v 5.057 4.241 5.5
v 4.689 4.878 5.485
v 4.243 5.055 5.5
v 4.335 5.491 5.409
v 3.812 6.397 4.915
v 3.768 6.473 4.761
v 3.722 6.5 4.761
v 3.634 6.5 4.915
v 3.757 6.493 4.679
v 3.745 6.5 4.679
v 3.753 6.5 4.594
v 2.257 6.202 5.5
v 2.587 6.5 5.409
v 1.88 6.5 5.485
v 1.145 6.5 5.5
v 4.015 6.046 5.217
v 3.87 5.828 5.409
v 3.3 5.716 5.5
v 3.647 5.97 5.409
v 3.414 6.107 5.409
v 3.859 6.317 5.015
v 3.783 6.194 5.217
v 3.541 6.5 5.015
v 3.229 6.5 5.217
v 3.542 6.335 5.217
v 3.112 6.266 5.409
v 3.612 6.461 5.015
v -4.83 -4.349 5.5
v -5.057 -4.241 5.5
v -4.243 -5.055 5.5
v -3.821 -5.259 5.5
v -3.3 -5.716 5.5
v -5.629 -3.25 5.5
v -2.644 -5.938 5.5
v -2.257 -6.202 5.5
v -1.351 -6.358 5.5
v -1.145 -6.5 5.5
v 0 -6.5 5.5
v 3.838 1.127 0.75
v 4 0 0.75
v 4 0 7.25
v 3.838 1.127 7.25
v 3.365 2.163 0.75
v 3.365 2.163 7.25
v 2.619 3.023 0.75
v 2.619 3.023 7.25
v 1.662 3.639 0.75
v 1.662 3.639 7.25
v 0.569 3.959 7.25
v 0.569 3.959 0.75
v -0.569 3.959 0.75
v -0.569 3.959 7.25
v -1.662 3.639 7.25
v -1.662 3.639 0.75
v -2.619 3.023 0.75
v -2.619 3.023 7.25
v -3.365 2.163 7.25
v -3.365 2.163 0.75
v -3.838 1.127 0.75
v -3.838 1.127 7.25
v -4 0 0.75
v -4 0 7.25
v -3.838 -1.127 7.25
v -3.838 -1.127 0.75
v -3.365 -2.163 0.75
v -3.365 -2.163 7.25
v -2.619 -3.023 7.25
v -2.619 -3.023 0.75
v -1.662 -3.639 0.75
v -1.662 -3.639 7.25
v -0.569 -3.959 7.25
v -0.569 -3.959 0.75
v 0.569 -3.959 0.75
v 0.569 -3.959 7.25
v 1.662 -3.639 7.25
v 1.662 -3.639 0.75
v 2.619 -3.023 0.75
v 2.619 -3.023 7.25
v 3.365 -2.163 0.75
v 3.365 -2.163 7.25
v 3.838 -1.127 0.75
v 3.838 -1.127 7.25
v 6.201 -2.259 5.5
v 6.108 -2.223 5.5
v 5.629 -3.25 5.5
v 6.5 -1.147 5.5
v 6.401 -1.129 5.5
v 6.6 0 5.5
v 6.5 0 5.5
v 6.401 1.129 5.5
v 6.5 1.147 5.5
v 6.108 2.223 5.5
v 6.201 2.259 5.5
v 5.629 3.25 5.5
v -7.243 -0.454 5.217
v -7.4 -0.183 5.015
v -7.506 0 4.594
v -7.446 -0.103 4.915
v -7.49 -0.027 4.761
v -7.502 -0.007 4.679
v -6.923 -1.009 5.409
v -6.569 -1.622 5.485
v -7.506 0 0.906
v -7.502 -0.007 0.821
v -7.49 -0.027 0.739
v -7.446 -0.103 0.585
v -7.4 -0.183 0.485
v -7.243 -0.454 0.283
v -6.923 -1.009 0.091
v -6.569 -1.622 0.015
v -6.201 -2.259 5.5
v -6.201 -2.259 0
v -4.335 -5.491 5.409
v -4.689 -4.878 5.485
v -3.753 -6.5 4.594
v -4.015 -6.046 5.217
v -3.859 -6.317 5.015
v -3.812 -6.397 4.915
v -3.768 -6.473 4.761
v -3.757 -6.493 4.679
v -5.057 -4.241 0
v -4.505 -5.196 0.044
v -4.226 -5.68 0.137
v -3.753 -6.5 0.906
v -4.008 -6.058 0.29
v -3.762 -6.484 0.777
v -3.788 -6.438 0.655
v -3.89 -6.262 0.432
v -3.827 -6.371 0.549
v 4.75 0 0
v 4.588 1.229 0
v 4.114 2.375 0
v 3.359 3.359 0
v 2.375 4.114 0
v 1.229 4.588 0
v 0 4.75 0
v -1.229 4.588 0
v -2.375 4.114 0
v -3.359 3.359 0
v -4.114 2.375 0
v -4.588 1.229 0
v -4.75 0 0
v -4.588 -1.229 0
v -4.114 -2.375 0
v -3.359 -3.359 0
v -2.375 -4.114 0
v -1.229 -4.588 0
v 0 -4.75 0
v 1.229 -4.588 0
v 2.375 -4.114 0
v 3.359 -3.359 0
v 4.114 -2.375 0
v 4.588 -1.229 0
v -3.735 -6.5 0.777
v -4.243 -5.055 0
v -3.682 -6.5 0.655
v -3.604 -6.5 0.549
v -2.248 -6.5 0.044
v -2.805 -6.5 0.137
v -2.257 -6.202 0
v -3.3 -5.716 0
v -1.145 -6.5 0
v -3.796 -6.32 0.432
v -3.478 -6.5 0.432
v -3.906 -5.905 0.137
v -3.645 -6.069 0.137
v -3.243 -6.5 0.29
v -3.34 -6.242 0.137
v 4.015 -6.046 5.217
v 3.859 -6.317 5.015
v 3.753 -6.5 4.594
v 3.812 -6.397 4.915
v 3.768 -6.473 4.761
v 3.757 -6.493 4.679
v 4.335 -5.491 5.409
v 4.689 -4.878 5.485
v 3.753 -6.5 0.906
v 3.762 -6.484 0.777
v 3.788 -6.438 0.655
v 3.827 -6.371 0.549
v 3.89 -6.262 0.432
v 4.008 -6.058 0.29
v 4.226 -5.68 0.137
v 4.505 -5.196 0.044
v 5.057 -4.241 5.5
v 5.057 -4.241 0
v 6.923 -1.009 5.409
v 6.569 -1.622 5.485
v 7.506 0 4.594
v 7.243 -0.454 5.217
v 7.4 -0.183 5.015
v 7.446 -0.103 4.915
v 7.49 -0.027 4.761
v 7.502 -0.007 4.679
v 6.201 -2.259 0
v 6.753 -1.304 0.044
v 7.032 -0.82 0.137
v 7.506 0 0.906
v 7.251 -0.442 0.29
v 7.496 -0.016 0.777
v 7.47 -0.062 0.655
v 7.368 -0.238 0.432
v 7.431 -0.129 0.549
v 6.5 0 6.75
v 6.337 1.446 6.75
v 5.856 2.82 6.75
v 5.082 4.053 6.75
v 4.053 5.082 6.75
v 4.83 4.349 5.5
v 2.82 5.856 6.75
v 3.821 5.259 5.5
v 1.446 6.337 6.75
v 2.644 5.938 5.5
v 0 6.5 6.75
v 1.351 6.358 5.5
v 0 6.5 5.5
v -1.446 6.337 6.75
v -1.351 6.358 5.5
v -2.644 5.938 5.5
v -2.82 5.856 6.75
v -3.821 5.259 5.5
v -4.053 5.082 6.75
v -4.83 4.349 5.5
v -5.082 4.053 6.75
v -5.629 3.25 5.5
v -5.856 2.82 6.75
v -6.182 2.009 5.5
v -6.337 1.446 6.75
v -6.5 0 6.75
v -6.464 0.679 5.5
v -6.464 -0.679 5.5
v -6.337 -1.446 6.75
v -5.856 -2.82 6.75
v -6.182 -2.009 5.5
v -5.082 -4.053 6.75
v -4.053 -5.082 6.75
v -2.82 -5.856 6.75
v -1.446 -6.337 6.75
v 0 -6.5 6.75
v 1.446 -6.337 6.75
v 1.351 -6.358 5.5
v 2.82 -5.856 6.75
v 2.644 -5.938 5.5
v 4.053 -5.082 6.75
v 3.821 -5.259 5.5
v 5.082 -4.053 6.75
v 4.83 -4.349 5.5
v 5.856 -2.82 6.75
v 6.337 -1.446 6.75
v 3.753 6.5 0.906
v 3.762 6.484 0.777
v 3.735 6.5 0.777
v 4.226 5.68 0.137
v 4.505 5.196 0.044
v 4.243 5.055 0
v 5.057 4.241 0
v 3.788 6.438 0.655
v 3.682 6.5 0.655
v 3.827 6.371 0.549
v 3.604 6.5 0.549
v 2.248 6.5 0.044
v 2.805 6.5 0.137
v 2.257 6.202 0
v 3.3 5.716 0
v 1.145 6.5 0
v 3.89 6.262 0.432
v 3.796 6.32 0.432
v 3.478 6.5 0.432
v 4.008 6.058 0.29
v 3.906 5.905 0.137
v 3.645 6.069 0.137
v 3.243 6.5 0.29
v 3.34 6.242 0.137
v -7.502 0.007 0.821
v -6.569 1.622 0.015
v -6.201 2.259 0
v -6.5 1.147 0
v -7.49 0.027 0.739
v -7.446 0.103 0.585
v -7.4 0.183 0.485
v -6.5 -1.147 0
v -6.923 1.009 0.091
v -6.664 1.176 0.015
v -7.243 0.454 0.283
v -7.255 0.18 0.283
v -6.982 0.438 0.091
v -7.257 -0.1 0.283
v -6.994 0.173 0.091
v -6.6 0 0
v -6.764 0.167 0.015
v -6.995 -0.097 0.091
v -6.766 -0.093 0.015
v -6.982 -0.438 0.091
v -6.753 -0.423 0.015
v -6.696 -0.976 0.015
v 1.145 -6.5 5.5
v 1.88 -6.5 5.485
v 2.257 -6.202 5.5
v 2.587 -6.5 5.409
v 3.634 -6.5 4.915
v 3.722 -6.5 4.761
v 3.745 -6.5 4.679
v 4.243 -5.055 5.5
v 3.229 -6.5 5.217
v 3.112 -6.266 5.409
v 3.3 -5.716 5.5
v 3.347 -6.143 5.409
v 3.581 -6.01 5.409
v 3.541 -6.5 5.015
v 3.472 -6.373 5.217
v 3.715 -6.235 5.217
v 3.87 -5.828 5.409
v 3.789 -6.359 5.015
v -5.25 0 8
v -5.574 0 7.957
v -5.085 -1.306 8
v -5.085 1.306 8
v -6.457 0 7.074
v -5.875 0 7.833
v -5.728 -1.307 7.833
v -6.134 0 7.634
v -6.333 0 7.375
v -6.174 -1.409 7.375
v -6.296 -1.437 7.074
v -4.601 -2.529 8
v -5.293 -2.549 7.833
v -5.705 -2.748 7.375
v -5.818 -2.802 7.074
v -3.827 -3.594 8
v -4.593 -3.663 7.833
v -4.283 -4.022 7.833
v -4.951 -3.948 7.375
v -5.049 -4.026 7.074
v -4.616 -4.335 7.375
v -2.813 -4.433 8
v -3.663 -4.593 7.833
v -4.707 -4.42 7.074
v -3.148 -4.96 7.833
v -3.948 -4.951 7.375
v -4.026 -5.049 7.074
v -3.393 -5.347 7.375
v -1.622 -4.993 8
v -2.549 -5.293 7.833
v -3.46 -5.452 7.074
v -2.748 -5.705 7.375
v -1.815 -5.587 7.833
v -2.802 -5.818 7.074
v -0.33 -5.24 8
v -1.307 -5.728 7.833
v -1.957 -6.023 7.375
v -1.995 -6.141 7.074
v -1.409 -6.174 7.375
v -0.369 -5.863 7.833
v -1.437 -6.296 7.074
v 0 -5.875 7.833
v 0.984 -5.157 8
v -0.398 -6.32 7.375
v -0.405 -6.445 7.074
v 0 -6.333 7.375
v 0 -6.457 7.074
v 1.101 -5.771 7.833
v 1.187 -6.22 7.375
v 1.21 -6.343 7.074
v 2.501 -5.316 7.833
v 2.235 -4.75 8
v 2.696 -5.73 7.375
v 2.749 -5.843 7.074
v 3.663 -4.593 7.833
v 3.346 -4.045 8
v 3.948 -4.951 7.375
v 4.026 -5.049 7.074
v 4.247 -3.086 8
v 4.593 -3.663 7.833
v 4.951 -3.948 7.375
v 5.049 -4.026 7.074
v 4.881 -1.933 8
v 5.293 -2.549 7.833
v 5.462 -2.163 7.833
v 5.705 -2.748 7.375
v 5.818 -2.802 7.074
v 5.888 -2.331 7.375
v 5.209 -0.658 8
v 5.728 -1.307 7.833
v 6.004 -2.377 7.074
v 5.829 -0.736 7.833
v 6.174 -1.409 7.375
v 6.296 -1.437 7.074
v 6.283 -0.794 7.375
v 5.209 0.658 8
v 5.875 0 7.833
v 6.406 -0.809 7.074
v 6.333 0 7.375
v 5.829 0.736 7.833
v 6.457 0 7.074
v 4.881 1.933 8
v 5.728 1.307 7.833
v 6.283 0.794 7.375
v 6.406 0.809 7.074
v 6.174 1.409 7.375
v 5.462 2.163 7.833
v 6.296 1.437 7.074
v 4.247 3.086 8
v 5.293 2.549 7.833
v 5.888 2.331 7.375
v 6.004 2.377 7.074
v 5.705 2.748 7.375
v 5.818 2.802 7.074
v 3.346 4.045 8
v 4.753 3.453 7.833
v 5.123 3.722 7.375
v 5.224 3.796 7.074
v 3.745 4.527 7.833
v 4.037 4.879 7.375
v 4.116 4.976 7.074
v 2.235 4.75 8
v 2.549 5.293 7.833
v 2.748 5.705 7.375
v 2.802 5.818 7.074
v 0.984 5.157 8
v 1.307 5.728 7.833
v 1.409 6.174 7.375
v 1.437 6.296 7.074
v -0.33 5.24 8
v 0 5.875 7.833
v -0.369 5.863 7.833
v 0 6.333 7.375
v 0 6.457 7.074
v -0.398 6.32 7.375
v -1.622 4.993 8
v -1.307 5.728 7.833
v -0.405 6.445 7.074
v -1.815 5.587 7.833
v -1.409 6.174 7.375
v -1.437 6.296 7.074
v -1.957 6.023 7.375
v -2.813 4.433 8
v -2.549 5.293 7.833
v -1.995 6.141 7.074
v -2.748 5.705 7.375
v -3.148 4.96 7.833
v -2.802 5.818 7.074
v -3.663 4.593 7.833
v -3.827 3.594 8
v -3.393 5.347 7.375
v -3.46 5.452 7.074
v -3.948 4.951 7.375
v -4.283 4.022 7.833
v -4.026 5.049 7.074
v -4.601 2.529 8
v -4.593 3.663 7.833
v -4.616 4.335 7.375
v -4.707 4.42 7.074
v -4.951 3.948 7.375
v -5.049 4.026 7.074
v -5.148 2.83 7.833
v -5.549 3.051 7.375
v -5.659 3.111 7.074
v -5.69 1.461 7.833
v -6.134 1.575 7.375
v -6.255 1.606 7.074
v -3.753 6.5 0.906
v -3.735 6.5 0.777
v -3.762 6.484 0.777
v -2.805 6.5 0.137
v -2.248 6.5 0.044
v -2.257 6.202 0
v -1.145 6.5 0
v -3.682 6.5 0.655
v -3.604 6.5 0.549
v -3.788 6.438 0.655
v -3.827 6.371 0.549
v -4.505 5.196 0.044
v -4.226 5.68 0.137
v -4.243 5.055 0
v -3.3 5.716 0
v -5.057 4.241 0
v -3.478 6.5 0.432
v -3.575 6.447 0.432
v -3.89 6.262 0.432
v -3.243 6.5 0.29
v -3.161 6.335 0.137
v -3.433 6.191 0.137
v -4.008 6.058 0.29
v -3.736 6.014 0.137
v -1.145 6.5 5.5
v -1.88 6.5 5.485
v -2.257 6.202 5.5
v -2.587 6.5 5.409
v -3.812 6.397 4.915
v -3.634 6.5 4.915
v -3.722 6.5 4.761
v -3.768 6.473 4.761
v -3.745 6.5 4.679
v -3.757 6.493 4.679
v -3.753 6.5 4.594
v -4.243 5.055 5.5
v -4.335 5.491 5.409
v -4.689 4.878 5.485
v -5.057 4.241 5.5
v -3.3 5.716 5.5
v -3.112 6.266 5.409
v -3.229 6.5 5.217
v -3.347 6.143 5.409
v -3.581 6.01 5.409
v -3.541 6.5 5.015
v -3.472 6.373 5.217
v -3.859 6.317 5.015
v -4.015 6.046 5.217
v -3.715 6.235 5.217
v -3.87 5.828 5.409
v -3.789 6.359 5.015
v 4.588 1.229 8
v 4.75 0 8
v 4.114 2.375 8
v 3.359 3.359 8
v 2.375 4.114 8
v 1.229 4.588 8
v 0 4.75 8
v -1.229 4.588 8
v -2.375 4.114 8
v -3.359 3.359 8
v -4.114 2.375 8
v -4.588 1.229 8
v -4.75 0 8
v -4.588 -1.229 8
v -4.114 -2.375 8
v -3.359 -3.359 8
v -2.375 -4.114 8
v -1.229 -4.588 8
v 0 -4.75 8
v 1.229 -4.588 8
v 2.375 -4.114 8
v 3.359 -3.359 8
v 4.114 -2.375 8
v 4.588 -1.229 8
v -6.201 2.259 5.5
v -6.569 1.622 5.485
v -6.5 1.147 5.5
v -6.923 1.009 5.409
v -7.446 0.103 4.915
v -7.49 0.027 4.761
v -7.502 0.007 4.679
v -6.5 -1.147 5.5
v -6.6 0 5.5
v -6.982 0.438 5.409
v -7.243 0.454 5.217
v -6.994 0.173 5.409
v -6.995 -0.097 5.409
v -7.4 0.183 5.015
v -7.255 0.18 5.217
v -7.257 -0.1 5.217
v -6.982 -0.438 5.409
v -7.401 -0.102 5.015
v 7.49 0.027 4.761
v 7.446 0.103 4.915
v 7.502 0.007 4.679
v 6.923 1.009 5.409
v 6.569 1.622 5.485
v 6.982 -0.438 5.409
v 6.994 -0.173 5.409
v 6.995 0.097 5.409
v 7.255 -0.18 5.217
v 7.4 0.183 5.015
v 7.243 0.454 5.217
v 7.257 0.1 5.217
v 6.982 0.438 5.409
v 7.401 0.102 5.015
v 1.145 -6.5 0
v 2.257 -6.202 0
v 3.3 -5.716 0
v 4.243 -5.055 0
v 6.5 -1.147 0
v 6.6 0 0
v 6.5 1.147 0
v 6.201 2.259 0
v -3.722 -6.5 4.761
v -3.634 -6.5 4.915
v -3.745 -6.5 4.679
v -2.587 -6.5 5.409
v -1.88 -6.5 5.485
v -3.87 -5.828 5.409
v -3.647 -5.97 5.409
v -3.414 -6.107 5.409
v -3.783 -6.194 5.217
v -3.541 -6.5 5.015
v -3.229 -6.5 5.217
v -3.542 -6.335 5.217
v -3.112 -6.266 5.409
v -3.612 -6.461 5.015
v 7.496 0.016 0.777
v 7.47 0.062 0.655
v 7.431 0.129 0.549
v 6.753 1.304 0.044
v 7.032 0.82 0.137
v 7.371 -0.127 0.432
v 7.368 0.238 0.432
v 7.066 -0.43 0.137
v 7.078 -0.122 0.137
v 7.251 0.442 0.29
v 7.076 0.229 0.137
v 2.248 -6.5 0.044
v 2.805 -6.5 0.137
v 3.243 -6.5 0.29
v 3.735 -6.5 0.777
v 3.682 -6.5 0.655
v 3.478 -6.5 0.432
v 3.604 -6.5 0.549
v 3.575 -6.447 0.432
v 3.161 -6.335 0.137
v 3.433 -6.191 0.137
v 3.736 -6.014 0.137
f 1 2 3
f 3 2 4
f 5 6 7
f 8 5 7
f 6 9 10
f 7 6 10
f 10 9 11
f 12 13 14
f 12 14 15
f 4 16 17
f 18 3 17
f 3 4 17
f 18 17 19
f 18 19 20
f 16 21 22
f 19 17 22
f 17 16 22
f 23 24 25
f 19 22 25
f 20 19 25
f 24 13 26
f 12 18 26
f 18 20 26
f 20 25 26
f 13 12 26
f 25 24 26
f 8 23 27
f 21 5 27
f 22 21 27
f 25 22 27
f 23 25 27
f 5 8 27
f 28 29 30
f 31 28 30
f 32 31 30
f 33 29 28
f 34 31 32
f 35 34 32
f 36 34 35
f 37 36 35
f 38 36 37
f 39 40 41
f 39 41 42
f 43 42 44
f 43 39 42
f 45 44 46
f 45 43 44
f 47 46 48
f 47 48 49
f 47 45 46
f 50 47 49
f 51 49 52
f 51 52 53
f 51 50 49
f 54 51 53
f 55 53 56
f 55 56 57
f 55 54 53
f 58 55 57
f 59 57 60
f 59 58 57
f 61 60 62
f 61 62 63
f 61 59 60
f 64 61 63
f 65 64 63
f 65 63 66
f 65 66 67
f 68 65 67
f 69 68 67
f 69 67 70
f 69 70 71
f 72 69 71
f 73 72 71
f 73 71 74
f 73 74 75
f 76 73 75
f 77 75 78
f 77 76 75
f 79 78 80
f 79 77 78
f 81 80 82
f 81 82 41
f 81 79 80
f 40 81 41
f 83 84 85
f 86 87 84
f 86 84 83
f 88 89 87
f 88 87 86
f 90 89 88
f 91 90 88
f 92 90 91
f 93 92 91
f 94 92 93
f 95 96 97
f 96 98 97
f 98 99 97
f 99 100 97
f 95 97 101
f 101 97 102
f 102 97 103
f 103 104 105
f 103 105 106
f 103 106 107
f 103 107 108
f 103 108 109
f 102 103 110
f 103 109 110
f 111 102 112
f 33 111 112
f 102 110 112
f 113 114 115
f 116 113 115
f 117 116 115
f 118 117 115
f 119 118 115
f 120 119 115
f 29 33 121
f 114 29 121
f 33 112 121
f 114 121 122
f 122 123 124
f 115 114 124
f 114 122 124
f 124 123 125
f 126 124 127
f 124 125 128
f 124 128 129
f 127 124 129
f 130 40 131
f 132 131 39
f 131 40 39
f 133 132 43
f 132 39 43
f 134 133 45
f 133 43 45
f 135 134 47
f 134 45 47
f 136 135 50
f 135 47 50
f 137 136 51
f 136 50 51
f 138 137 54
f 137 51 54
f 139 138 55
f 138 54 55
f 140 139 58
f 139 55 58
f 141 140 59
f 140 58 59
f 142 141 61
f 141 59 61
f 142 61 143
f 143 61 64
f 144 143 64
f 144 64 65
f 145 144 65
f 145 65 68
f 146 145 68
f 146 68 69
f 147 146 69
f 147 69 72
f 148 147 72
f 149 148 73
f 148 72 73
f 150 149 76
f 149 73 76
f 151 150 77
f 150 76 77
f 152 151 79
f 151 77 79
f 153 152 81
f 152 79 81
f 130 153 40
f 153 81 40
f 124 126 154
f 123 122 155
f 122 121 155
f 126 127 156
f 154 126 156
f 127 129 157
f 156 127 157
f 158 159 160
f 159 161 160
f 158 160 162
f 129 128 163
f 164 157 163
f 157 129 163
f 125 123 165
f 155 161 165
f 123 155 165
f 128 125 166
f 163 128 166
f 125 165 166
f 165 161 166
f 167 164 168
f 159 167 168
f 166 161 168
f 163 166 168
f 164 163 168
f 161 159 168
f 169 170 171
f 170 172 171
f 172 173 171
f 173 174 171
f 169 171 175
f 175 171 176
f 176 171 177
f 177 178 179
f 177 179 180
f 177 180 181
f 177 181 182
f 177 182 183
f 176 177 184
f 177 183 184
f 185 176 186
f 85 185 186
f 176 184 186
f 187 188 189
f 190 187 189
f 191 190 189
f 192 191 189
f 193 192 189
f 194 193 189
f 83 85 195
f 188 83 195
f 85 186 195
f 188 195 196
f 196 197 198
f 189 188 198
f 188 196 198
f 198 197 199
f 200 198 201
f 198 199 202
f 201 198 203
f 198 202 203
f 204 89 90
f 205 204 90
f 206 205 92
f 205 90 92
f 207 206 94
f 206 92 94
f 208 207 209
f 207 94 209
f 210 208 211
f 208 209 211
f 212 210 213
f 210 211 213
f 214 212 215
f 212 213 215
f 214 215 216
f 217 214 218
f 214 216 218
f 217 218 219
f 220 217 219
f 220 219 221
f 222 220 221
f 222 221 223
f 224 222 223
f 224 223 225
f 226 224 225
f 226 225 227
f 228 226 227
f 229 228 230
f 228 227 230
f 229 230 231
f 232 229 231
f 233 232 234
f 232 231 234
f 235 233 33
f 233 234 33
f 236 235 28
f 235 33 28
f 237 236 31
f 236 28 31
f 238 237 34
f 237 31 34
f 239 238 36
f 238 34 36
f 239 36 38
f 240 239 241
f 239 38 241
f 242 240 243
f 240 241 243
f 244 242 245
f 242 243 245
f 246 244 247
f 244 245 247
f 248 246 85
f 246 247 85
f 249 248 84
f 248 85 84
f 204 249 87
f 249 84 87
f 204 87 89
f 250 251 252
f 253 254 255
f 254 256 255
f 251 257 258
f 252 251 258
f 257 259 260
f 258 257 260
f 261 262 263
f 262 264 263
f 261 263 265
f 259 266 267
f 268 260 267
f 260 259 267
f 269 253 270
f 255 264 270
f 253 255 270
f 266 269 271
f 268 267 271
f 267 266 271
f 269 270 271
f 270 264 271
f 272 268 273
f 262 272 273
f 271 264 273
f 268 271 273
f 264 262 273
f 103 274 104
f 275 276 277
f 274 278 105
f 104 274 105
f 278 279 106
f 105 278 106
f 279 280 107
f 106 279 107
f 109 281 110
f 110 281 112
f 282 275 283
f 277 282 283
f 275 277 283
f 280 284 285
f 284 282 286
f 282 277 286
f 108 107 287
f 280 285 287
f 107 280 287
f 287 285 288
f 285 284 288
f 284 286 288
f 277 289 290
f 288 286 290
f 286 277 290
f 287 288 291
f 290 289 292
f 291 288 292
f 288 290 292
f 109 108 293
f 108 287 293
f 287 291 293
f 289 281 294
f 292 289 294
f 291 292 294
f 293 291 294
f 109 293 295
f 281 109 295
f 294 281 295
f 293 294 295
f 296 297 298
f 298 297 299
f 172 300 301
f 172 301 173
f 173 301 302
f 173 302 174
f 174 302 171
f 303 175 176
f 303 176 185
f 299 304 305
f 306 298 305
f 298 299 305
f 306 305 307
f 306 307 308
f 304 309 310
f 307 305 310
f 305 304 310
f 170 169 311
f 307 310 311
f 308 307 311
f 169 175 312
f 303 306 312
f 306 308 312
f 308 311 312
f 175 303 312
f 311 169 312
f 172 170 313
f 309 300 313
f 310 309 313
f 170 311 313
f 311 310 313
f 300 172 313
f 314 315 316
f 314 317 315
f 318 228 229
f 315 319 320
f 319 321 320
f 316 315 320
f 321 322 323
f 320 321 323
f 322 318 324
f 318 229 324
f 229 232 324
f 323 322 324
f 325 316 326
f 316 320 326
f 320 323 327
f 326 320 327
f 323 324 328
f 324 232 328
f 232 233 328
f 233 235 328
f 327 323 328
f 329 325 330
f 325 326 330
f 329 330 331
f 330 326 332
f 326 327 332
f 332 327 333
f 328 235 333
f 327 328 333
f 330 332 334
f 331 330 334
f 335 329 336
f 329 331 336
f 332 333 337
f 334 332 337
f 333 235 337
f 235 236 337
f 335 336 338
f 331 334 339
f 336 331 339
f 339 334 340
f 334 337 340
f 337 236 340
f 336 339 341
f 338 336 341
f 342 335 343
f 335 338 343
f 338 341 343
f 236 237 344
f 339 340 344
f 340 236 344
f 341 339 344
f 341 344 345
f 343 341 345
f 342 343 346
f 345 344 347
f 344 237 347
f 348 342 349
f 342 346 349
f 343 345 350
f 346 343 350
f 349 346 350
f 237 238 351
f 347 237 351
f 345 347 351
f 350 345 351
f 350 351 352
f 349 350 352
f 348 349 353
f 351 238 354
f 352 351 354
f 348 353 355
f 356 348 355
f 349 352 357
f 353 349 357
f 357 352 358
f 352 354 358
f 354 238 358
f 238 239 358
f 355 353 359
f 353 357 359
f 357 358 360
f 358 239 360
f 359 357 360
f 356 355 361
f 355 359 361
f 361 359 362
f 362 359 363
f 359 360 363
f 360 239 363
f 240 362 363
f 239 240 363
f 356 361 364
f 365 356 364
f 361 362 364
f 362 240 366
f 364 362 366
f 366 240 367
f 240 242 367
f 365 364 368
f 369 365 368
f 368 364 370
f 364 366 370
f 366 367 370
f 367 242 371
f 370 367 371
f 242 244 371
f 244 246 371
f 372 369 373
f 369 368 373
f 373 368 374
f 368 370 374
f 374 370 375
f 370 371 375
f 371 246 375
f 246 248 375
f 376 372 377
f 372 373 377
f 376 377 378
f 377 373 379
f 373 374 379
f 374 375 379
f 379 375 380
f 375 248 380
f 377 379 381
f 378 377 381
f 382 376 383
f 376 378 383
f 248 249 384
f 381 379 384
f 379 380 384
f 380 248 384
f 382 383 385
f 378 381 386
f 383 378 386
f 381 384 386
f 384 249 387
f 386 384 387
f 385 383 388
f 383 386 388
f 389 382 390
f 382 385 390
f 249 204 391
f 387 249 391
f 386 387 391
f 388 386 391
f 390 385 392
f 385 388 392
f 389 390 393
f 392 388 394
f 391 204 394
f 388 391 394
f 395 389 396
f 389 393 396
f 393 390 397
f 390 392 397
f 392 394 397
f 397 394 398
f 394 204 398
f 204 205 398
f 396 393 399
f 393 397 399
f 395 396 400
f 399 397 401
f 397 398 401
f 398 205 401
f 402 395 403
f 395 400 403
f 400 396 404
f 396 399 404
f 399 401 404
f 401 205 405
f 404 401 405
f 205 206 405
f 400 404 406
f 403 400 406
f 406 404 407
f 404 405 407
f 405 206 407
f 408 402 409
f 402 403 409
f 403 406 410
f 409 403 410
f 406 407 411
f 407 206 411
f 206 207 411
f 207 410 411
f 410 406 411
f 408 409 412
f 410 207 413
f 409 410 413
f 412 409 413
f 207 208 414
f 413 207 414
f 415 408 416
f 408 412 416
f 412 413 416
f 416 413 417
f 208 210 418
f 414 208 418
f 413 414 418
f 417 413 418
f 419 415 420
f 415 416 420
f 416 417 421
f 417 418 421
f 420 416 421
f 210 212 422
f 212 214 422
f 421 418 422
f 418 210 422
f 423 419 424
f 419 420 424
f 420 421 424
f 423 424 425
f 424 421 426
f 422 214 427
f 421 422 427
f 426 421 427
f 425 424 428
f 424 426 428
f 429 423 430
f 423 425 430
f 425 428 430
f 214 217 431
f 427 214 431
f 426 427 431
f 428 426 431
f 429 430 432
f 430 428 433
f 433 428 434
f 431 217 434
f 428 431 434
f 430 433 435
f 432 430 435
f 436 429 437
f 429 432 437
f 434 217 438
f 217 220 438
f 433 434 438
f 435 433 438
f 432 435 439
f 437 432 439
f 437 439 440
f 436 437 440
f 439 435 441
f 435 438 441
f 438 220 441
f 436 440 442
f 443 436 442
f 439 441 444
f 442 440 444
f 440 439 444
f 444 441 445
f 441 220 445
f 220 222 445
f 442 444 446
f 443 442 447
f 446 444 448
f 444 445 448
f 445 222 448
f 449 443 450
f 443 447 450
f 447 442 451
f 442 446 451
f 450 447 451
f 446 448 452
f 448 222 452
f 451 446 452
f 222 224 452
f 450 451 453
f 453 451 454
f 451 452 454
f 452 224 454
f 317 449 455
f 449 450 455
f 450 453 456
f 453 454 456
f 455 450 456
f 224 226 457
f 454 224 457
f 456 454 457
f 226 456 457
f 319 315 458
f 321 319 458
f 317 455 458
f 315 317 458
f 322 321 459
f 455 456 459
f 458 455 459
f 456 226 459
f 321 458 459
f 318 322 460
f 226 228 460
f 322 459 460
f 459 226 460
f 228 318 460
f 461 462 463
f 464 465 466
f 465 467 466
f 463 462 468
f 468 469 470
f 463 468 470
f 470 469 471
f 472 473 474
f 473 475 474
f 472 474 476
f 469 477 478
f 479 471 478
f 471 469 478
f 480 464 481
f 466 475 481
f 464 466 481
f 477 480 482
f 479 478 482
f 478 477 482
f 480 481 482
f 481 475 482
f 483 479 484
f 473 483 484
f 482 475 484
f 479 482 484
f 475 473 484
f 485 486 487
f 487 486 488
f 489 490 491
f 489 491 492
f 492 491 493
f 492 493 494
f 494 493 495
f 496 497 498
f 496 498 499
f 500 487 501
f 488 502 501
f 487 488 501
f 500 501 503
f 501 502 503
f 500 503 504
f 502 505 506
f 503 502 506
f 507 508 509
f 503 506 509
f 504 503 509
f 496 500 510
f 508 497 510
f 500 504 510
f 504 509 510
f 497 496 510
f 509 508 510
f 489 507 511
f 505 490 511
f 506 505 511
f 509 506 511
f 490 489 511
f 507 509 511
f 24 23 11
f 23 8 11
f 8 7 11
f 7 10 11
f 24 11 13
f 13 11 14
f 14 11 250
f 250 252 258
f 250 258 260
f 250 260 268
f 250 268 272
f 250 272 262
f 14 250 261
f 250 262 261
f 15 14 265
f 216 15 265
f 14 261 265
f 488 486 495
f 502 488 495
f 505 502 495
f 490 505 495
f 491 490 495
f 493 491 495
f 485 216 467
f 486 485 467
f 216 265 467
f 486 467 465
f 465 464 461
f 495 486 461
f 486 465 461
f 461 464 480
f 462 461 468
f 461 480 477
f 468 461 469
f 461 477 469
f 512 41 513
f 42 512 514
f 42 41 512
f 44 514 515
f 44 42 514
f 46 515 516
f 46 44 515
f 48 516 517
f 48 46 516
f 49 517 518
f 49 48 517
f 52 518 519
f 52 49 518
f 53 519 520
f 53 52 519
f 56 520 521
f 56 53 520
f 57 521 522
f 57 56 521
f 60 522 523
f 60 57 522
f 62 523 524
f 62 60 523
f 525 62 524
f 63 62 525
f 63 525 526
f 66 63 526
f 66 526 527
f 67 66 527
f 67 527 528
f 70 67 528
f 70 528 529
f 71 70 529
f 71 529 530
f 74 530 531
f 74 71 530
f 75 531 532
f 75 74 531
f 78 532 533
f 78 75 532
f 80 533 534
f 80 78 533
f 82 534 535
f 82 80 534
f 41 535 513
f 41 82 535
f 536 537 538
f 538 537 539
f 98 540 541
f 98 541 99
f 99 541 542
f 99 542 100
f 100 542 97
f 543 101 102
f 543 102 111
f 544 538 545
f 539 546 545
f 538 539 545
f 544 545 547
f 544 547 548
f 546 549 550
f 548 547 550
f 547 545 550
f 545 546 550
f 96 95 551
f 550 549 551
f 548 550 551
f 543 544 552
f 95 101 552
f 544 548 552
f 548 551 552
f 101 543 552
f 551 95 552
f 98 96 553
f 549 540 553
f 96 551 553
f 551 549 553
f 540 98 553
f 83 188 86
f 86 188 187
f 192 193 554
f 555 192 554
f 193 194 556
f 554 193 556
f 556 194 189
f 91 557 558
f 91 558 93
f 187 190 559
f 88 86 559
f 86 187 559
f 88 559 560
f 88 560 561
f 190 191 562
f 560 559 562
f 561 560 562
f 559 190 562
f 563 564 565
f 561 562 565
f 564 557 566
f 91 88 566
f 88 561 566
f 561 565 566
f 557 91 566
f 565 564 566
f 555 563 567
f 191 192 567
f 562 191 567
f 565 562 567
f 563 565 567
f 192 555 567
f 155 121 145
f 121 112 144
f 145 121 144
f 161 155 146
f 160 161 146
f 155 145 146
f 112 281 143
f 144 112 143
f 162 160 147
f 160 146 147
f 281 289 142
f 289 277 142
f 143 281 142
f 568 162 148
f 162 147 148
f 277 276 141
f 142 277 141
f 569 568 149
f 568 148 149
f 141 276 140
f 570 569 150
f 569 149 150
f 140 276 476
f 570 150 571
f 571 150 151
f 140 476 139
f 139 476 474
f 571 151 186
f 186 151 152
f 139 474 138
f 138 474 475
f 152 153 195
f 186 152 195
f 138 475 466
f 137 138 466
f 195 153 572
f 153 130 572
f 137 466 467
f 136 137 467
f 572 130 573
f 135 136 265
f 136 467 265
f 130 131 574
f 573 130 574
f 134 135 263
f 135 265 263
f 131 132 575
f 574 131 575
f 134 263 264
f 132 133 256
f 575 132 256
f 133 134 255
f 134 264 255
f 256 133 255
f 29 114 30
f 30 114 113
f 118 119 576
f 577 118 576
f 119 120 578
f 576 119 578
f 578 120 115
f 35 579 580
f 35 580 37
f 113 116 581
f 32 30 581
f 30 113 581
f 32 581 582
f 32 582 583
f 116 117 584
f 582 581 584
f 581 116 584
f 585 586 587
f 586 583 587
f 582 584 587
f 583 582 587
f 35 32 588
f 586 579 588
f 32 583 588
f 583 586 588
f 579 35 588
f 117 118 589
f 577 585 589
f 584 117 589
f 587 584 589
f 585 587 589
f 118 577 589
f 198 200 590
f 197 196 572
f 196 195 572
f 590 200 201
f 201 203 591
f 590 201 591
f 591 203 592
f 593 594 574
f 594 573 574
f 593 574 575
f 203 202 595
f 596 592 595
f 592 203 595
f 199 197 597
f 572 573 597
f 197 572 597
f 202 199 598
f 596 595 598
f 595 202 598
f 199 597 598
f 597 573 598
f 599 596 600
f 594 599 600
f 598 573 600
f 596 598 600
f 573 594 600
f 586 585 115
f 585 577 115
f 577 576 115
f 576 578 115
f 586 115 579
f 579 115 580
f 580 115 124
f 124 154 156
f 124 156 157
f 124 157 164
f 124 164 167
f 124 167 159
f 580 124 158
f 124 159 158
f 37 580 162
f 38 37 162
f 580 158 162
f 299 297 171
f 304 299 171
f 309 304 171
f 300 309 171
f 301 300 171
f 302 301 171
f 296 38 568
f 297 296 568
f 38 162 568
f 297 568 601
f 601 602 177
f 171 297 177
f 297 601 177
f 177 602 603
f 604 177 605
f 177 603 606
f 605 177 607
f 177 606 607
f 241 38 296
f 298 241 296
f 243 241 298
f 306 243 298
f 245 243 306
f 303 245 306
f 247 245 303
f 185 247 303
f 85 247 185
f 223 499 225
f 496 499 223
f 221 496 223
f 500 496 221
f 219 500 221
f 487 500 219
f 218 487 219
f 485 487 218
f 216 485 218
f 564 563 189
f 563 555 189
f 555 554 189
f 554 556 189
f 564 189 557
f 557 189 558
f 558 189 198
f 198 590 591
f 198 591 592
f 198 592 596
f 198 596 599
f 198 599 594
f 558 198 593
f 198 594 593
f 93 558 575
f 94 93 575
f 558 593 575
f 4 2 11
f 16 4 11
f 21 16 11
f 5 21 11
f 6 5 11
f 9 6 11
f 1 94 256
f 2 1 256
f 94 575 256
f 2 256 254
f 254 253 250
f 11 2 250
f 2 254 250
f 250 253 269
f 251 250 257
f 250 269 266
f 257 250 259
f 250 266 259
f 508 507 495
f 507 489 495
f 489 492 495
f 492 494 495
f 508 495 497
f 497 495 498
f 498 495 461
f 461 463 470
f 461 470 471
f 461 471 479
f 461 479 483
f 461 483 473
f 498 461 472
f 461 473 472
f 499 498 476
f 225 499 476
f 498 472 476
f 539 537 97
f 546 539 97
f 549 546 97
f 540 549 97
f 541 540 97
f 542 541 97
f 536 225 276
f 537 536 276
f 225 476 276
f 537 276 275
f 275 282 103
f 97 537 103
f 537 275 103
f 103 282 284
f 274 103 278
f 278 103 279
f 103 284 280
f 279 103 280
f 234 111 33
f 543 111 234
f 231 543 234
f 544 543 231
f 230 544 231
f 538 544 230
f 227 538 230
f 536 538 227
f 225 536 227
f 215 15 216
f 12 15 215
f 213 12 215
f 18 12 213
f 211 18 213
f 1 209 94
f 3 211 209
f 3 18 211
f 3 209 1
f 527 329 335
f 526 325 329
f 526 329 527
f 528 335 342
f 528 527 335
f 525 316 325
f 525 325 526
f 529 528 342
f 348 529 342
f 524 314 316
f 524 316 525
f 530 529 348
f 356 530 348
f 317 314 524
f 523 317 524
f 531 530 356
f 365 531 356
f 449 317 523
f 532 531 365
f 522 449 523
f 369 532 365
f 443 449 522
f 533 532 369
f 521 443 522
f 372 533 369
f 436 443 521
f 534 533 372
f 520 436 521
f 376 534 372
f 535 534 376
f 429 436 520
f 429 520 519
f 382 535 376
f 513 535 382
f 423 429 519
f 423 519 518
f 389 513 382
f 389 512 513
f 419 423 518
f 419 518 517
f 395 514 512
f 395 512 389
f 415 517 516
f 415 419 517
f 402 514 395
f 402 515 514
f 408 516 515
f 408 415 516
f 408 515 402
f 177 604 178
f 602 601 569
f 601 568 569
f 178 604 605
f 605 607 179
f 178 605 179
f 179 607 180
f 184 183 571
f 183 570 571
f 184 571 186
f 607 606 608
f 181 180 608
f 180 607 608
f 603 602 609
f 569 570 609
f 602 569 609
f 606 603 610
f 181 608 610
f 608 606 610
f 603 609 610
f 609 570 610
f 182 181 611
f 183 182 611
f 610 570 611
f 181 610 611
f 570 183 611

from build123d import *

# Parameters (mm, degrees)
SZKIC1_R                    = 4
DODANIE_WYCI_GNI_CIE1_DEPTH = 5.5
SZKIC2_R                    = 6.5
SZKIC2_R_2                  = 4
DODANIE_WYCI_GNI_CIE2_DEPTH = 8
SFAZOWANIE1_SIZE            = 0.75


with BuildPart() as part:
    # Szkic1 → Dodanie-wyciągnięcie1 (new body)
    with BuildSketch(Plane.XY):
        Polygon((-7.505553499, 0), (-3.75277675, -6.5), (3.75277675, -6.5), (7.505553499, 0), (3.75277675, 6.5), (-3.75277675, 6.5), align=None)
        Circle(SZKIC1_R, mode=Mode.SUBTRACT)
    extrude(amount=DODANIE_WYCI_GNI_CIE1_DEPTH)

    # Szkic2 → Dodanie-wyciągnięcie2 (add)
    with BuildSketch(Plane.XY):
        Circle(SZKIC2_R)
        Circle(SZKIC2_R_2, mode=Mode.SUBTRACT)
    extrude(amount=DODANIE_WYCI_GNI_CIE2_DEPTH)

    # Sfazowanie1
    sfazowanie1_edges = [part.edges().sort_by_distance(p)[0] for p in [
        (-4, 0, 0),
        (-4, 0, 8),
    ]]
    chamfer(sfazowanie1_edges, length=SFAZOWANIE1_SIZE)

    # Szkic3 → Wycięcie-obrót1 (revolve, cut)
    with BuildSketch(Plane(origin=(0, 0, 0), x_dir=(1, 0, 0), z_dir=(0, 1, 0))):
        with BuildLine():
            Line((-7.505553499, 0), (-7.505553499, -0.905553499))
            ThreePointArc((-7.505553499, -0.905553499), (-7.24032302, -0.265230479), (-6.6, 0))
            Line((-6.6, 0), (-7.505553499, 0))
        make_face()
        with BuildLine():
            ThreePointArc((-6.6, -5.5), (-7.24032302, -5.234769521), (-7.505553499, -4.594446501))
            Line((-7.505553499, -4.594446501), (-7.505553499, -5.5))
            Line((-7.505553499, -5.5), (-6.6, -5.5))
        make_face()
        with BuildLine():
            Line((-6.5, -8), (-5.25, -8))
            ThreePointArc((-5.25, -8), (-6.133883476, -7.633883476), (-6.5, -6.75))
            Line((-6.5, -6.75), (-6.5, -8))
        make_face()
    revolve(axis=Axis((0, 0, -1.701574894), (0, 0, 1)), mode=Mode.SUBTRACT)


solid = part.part
